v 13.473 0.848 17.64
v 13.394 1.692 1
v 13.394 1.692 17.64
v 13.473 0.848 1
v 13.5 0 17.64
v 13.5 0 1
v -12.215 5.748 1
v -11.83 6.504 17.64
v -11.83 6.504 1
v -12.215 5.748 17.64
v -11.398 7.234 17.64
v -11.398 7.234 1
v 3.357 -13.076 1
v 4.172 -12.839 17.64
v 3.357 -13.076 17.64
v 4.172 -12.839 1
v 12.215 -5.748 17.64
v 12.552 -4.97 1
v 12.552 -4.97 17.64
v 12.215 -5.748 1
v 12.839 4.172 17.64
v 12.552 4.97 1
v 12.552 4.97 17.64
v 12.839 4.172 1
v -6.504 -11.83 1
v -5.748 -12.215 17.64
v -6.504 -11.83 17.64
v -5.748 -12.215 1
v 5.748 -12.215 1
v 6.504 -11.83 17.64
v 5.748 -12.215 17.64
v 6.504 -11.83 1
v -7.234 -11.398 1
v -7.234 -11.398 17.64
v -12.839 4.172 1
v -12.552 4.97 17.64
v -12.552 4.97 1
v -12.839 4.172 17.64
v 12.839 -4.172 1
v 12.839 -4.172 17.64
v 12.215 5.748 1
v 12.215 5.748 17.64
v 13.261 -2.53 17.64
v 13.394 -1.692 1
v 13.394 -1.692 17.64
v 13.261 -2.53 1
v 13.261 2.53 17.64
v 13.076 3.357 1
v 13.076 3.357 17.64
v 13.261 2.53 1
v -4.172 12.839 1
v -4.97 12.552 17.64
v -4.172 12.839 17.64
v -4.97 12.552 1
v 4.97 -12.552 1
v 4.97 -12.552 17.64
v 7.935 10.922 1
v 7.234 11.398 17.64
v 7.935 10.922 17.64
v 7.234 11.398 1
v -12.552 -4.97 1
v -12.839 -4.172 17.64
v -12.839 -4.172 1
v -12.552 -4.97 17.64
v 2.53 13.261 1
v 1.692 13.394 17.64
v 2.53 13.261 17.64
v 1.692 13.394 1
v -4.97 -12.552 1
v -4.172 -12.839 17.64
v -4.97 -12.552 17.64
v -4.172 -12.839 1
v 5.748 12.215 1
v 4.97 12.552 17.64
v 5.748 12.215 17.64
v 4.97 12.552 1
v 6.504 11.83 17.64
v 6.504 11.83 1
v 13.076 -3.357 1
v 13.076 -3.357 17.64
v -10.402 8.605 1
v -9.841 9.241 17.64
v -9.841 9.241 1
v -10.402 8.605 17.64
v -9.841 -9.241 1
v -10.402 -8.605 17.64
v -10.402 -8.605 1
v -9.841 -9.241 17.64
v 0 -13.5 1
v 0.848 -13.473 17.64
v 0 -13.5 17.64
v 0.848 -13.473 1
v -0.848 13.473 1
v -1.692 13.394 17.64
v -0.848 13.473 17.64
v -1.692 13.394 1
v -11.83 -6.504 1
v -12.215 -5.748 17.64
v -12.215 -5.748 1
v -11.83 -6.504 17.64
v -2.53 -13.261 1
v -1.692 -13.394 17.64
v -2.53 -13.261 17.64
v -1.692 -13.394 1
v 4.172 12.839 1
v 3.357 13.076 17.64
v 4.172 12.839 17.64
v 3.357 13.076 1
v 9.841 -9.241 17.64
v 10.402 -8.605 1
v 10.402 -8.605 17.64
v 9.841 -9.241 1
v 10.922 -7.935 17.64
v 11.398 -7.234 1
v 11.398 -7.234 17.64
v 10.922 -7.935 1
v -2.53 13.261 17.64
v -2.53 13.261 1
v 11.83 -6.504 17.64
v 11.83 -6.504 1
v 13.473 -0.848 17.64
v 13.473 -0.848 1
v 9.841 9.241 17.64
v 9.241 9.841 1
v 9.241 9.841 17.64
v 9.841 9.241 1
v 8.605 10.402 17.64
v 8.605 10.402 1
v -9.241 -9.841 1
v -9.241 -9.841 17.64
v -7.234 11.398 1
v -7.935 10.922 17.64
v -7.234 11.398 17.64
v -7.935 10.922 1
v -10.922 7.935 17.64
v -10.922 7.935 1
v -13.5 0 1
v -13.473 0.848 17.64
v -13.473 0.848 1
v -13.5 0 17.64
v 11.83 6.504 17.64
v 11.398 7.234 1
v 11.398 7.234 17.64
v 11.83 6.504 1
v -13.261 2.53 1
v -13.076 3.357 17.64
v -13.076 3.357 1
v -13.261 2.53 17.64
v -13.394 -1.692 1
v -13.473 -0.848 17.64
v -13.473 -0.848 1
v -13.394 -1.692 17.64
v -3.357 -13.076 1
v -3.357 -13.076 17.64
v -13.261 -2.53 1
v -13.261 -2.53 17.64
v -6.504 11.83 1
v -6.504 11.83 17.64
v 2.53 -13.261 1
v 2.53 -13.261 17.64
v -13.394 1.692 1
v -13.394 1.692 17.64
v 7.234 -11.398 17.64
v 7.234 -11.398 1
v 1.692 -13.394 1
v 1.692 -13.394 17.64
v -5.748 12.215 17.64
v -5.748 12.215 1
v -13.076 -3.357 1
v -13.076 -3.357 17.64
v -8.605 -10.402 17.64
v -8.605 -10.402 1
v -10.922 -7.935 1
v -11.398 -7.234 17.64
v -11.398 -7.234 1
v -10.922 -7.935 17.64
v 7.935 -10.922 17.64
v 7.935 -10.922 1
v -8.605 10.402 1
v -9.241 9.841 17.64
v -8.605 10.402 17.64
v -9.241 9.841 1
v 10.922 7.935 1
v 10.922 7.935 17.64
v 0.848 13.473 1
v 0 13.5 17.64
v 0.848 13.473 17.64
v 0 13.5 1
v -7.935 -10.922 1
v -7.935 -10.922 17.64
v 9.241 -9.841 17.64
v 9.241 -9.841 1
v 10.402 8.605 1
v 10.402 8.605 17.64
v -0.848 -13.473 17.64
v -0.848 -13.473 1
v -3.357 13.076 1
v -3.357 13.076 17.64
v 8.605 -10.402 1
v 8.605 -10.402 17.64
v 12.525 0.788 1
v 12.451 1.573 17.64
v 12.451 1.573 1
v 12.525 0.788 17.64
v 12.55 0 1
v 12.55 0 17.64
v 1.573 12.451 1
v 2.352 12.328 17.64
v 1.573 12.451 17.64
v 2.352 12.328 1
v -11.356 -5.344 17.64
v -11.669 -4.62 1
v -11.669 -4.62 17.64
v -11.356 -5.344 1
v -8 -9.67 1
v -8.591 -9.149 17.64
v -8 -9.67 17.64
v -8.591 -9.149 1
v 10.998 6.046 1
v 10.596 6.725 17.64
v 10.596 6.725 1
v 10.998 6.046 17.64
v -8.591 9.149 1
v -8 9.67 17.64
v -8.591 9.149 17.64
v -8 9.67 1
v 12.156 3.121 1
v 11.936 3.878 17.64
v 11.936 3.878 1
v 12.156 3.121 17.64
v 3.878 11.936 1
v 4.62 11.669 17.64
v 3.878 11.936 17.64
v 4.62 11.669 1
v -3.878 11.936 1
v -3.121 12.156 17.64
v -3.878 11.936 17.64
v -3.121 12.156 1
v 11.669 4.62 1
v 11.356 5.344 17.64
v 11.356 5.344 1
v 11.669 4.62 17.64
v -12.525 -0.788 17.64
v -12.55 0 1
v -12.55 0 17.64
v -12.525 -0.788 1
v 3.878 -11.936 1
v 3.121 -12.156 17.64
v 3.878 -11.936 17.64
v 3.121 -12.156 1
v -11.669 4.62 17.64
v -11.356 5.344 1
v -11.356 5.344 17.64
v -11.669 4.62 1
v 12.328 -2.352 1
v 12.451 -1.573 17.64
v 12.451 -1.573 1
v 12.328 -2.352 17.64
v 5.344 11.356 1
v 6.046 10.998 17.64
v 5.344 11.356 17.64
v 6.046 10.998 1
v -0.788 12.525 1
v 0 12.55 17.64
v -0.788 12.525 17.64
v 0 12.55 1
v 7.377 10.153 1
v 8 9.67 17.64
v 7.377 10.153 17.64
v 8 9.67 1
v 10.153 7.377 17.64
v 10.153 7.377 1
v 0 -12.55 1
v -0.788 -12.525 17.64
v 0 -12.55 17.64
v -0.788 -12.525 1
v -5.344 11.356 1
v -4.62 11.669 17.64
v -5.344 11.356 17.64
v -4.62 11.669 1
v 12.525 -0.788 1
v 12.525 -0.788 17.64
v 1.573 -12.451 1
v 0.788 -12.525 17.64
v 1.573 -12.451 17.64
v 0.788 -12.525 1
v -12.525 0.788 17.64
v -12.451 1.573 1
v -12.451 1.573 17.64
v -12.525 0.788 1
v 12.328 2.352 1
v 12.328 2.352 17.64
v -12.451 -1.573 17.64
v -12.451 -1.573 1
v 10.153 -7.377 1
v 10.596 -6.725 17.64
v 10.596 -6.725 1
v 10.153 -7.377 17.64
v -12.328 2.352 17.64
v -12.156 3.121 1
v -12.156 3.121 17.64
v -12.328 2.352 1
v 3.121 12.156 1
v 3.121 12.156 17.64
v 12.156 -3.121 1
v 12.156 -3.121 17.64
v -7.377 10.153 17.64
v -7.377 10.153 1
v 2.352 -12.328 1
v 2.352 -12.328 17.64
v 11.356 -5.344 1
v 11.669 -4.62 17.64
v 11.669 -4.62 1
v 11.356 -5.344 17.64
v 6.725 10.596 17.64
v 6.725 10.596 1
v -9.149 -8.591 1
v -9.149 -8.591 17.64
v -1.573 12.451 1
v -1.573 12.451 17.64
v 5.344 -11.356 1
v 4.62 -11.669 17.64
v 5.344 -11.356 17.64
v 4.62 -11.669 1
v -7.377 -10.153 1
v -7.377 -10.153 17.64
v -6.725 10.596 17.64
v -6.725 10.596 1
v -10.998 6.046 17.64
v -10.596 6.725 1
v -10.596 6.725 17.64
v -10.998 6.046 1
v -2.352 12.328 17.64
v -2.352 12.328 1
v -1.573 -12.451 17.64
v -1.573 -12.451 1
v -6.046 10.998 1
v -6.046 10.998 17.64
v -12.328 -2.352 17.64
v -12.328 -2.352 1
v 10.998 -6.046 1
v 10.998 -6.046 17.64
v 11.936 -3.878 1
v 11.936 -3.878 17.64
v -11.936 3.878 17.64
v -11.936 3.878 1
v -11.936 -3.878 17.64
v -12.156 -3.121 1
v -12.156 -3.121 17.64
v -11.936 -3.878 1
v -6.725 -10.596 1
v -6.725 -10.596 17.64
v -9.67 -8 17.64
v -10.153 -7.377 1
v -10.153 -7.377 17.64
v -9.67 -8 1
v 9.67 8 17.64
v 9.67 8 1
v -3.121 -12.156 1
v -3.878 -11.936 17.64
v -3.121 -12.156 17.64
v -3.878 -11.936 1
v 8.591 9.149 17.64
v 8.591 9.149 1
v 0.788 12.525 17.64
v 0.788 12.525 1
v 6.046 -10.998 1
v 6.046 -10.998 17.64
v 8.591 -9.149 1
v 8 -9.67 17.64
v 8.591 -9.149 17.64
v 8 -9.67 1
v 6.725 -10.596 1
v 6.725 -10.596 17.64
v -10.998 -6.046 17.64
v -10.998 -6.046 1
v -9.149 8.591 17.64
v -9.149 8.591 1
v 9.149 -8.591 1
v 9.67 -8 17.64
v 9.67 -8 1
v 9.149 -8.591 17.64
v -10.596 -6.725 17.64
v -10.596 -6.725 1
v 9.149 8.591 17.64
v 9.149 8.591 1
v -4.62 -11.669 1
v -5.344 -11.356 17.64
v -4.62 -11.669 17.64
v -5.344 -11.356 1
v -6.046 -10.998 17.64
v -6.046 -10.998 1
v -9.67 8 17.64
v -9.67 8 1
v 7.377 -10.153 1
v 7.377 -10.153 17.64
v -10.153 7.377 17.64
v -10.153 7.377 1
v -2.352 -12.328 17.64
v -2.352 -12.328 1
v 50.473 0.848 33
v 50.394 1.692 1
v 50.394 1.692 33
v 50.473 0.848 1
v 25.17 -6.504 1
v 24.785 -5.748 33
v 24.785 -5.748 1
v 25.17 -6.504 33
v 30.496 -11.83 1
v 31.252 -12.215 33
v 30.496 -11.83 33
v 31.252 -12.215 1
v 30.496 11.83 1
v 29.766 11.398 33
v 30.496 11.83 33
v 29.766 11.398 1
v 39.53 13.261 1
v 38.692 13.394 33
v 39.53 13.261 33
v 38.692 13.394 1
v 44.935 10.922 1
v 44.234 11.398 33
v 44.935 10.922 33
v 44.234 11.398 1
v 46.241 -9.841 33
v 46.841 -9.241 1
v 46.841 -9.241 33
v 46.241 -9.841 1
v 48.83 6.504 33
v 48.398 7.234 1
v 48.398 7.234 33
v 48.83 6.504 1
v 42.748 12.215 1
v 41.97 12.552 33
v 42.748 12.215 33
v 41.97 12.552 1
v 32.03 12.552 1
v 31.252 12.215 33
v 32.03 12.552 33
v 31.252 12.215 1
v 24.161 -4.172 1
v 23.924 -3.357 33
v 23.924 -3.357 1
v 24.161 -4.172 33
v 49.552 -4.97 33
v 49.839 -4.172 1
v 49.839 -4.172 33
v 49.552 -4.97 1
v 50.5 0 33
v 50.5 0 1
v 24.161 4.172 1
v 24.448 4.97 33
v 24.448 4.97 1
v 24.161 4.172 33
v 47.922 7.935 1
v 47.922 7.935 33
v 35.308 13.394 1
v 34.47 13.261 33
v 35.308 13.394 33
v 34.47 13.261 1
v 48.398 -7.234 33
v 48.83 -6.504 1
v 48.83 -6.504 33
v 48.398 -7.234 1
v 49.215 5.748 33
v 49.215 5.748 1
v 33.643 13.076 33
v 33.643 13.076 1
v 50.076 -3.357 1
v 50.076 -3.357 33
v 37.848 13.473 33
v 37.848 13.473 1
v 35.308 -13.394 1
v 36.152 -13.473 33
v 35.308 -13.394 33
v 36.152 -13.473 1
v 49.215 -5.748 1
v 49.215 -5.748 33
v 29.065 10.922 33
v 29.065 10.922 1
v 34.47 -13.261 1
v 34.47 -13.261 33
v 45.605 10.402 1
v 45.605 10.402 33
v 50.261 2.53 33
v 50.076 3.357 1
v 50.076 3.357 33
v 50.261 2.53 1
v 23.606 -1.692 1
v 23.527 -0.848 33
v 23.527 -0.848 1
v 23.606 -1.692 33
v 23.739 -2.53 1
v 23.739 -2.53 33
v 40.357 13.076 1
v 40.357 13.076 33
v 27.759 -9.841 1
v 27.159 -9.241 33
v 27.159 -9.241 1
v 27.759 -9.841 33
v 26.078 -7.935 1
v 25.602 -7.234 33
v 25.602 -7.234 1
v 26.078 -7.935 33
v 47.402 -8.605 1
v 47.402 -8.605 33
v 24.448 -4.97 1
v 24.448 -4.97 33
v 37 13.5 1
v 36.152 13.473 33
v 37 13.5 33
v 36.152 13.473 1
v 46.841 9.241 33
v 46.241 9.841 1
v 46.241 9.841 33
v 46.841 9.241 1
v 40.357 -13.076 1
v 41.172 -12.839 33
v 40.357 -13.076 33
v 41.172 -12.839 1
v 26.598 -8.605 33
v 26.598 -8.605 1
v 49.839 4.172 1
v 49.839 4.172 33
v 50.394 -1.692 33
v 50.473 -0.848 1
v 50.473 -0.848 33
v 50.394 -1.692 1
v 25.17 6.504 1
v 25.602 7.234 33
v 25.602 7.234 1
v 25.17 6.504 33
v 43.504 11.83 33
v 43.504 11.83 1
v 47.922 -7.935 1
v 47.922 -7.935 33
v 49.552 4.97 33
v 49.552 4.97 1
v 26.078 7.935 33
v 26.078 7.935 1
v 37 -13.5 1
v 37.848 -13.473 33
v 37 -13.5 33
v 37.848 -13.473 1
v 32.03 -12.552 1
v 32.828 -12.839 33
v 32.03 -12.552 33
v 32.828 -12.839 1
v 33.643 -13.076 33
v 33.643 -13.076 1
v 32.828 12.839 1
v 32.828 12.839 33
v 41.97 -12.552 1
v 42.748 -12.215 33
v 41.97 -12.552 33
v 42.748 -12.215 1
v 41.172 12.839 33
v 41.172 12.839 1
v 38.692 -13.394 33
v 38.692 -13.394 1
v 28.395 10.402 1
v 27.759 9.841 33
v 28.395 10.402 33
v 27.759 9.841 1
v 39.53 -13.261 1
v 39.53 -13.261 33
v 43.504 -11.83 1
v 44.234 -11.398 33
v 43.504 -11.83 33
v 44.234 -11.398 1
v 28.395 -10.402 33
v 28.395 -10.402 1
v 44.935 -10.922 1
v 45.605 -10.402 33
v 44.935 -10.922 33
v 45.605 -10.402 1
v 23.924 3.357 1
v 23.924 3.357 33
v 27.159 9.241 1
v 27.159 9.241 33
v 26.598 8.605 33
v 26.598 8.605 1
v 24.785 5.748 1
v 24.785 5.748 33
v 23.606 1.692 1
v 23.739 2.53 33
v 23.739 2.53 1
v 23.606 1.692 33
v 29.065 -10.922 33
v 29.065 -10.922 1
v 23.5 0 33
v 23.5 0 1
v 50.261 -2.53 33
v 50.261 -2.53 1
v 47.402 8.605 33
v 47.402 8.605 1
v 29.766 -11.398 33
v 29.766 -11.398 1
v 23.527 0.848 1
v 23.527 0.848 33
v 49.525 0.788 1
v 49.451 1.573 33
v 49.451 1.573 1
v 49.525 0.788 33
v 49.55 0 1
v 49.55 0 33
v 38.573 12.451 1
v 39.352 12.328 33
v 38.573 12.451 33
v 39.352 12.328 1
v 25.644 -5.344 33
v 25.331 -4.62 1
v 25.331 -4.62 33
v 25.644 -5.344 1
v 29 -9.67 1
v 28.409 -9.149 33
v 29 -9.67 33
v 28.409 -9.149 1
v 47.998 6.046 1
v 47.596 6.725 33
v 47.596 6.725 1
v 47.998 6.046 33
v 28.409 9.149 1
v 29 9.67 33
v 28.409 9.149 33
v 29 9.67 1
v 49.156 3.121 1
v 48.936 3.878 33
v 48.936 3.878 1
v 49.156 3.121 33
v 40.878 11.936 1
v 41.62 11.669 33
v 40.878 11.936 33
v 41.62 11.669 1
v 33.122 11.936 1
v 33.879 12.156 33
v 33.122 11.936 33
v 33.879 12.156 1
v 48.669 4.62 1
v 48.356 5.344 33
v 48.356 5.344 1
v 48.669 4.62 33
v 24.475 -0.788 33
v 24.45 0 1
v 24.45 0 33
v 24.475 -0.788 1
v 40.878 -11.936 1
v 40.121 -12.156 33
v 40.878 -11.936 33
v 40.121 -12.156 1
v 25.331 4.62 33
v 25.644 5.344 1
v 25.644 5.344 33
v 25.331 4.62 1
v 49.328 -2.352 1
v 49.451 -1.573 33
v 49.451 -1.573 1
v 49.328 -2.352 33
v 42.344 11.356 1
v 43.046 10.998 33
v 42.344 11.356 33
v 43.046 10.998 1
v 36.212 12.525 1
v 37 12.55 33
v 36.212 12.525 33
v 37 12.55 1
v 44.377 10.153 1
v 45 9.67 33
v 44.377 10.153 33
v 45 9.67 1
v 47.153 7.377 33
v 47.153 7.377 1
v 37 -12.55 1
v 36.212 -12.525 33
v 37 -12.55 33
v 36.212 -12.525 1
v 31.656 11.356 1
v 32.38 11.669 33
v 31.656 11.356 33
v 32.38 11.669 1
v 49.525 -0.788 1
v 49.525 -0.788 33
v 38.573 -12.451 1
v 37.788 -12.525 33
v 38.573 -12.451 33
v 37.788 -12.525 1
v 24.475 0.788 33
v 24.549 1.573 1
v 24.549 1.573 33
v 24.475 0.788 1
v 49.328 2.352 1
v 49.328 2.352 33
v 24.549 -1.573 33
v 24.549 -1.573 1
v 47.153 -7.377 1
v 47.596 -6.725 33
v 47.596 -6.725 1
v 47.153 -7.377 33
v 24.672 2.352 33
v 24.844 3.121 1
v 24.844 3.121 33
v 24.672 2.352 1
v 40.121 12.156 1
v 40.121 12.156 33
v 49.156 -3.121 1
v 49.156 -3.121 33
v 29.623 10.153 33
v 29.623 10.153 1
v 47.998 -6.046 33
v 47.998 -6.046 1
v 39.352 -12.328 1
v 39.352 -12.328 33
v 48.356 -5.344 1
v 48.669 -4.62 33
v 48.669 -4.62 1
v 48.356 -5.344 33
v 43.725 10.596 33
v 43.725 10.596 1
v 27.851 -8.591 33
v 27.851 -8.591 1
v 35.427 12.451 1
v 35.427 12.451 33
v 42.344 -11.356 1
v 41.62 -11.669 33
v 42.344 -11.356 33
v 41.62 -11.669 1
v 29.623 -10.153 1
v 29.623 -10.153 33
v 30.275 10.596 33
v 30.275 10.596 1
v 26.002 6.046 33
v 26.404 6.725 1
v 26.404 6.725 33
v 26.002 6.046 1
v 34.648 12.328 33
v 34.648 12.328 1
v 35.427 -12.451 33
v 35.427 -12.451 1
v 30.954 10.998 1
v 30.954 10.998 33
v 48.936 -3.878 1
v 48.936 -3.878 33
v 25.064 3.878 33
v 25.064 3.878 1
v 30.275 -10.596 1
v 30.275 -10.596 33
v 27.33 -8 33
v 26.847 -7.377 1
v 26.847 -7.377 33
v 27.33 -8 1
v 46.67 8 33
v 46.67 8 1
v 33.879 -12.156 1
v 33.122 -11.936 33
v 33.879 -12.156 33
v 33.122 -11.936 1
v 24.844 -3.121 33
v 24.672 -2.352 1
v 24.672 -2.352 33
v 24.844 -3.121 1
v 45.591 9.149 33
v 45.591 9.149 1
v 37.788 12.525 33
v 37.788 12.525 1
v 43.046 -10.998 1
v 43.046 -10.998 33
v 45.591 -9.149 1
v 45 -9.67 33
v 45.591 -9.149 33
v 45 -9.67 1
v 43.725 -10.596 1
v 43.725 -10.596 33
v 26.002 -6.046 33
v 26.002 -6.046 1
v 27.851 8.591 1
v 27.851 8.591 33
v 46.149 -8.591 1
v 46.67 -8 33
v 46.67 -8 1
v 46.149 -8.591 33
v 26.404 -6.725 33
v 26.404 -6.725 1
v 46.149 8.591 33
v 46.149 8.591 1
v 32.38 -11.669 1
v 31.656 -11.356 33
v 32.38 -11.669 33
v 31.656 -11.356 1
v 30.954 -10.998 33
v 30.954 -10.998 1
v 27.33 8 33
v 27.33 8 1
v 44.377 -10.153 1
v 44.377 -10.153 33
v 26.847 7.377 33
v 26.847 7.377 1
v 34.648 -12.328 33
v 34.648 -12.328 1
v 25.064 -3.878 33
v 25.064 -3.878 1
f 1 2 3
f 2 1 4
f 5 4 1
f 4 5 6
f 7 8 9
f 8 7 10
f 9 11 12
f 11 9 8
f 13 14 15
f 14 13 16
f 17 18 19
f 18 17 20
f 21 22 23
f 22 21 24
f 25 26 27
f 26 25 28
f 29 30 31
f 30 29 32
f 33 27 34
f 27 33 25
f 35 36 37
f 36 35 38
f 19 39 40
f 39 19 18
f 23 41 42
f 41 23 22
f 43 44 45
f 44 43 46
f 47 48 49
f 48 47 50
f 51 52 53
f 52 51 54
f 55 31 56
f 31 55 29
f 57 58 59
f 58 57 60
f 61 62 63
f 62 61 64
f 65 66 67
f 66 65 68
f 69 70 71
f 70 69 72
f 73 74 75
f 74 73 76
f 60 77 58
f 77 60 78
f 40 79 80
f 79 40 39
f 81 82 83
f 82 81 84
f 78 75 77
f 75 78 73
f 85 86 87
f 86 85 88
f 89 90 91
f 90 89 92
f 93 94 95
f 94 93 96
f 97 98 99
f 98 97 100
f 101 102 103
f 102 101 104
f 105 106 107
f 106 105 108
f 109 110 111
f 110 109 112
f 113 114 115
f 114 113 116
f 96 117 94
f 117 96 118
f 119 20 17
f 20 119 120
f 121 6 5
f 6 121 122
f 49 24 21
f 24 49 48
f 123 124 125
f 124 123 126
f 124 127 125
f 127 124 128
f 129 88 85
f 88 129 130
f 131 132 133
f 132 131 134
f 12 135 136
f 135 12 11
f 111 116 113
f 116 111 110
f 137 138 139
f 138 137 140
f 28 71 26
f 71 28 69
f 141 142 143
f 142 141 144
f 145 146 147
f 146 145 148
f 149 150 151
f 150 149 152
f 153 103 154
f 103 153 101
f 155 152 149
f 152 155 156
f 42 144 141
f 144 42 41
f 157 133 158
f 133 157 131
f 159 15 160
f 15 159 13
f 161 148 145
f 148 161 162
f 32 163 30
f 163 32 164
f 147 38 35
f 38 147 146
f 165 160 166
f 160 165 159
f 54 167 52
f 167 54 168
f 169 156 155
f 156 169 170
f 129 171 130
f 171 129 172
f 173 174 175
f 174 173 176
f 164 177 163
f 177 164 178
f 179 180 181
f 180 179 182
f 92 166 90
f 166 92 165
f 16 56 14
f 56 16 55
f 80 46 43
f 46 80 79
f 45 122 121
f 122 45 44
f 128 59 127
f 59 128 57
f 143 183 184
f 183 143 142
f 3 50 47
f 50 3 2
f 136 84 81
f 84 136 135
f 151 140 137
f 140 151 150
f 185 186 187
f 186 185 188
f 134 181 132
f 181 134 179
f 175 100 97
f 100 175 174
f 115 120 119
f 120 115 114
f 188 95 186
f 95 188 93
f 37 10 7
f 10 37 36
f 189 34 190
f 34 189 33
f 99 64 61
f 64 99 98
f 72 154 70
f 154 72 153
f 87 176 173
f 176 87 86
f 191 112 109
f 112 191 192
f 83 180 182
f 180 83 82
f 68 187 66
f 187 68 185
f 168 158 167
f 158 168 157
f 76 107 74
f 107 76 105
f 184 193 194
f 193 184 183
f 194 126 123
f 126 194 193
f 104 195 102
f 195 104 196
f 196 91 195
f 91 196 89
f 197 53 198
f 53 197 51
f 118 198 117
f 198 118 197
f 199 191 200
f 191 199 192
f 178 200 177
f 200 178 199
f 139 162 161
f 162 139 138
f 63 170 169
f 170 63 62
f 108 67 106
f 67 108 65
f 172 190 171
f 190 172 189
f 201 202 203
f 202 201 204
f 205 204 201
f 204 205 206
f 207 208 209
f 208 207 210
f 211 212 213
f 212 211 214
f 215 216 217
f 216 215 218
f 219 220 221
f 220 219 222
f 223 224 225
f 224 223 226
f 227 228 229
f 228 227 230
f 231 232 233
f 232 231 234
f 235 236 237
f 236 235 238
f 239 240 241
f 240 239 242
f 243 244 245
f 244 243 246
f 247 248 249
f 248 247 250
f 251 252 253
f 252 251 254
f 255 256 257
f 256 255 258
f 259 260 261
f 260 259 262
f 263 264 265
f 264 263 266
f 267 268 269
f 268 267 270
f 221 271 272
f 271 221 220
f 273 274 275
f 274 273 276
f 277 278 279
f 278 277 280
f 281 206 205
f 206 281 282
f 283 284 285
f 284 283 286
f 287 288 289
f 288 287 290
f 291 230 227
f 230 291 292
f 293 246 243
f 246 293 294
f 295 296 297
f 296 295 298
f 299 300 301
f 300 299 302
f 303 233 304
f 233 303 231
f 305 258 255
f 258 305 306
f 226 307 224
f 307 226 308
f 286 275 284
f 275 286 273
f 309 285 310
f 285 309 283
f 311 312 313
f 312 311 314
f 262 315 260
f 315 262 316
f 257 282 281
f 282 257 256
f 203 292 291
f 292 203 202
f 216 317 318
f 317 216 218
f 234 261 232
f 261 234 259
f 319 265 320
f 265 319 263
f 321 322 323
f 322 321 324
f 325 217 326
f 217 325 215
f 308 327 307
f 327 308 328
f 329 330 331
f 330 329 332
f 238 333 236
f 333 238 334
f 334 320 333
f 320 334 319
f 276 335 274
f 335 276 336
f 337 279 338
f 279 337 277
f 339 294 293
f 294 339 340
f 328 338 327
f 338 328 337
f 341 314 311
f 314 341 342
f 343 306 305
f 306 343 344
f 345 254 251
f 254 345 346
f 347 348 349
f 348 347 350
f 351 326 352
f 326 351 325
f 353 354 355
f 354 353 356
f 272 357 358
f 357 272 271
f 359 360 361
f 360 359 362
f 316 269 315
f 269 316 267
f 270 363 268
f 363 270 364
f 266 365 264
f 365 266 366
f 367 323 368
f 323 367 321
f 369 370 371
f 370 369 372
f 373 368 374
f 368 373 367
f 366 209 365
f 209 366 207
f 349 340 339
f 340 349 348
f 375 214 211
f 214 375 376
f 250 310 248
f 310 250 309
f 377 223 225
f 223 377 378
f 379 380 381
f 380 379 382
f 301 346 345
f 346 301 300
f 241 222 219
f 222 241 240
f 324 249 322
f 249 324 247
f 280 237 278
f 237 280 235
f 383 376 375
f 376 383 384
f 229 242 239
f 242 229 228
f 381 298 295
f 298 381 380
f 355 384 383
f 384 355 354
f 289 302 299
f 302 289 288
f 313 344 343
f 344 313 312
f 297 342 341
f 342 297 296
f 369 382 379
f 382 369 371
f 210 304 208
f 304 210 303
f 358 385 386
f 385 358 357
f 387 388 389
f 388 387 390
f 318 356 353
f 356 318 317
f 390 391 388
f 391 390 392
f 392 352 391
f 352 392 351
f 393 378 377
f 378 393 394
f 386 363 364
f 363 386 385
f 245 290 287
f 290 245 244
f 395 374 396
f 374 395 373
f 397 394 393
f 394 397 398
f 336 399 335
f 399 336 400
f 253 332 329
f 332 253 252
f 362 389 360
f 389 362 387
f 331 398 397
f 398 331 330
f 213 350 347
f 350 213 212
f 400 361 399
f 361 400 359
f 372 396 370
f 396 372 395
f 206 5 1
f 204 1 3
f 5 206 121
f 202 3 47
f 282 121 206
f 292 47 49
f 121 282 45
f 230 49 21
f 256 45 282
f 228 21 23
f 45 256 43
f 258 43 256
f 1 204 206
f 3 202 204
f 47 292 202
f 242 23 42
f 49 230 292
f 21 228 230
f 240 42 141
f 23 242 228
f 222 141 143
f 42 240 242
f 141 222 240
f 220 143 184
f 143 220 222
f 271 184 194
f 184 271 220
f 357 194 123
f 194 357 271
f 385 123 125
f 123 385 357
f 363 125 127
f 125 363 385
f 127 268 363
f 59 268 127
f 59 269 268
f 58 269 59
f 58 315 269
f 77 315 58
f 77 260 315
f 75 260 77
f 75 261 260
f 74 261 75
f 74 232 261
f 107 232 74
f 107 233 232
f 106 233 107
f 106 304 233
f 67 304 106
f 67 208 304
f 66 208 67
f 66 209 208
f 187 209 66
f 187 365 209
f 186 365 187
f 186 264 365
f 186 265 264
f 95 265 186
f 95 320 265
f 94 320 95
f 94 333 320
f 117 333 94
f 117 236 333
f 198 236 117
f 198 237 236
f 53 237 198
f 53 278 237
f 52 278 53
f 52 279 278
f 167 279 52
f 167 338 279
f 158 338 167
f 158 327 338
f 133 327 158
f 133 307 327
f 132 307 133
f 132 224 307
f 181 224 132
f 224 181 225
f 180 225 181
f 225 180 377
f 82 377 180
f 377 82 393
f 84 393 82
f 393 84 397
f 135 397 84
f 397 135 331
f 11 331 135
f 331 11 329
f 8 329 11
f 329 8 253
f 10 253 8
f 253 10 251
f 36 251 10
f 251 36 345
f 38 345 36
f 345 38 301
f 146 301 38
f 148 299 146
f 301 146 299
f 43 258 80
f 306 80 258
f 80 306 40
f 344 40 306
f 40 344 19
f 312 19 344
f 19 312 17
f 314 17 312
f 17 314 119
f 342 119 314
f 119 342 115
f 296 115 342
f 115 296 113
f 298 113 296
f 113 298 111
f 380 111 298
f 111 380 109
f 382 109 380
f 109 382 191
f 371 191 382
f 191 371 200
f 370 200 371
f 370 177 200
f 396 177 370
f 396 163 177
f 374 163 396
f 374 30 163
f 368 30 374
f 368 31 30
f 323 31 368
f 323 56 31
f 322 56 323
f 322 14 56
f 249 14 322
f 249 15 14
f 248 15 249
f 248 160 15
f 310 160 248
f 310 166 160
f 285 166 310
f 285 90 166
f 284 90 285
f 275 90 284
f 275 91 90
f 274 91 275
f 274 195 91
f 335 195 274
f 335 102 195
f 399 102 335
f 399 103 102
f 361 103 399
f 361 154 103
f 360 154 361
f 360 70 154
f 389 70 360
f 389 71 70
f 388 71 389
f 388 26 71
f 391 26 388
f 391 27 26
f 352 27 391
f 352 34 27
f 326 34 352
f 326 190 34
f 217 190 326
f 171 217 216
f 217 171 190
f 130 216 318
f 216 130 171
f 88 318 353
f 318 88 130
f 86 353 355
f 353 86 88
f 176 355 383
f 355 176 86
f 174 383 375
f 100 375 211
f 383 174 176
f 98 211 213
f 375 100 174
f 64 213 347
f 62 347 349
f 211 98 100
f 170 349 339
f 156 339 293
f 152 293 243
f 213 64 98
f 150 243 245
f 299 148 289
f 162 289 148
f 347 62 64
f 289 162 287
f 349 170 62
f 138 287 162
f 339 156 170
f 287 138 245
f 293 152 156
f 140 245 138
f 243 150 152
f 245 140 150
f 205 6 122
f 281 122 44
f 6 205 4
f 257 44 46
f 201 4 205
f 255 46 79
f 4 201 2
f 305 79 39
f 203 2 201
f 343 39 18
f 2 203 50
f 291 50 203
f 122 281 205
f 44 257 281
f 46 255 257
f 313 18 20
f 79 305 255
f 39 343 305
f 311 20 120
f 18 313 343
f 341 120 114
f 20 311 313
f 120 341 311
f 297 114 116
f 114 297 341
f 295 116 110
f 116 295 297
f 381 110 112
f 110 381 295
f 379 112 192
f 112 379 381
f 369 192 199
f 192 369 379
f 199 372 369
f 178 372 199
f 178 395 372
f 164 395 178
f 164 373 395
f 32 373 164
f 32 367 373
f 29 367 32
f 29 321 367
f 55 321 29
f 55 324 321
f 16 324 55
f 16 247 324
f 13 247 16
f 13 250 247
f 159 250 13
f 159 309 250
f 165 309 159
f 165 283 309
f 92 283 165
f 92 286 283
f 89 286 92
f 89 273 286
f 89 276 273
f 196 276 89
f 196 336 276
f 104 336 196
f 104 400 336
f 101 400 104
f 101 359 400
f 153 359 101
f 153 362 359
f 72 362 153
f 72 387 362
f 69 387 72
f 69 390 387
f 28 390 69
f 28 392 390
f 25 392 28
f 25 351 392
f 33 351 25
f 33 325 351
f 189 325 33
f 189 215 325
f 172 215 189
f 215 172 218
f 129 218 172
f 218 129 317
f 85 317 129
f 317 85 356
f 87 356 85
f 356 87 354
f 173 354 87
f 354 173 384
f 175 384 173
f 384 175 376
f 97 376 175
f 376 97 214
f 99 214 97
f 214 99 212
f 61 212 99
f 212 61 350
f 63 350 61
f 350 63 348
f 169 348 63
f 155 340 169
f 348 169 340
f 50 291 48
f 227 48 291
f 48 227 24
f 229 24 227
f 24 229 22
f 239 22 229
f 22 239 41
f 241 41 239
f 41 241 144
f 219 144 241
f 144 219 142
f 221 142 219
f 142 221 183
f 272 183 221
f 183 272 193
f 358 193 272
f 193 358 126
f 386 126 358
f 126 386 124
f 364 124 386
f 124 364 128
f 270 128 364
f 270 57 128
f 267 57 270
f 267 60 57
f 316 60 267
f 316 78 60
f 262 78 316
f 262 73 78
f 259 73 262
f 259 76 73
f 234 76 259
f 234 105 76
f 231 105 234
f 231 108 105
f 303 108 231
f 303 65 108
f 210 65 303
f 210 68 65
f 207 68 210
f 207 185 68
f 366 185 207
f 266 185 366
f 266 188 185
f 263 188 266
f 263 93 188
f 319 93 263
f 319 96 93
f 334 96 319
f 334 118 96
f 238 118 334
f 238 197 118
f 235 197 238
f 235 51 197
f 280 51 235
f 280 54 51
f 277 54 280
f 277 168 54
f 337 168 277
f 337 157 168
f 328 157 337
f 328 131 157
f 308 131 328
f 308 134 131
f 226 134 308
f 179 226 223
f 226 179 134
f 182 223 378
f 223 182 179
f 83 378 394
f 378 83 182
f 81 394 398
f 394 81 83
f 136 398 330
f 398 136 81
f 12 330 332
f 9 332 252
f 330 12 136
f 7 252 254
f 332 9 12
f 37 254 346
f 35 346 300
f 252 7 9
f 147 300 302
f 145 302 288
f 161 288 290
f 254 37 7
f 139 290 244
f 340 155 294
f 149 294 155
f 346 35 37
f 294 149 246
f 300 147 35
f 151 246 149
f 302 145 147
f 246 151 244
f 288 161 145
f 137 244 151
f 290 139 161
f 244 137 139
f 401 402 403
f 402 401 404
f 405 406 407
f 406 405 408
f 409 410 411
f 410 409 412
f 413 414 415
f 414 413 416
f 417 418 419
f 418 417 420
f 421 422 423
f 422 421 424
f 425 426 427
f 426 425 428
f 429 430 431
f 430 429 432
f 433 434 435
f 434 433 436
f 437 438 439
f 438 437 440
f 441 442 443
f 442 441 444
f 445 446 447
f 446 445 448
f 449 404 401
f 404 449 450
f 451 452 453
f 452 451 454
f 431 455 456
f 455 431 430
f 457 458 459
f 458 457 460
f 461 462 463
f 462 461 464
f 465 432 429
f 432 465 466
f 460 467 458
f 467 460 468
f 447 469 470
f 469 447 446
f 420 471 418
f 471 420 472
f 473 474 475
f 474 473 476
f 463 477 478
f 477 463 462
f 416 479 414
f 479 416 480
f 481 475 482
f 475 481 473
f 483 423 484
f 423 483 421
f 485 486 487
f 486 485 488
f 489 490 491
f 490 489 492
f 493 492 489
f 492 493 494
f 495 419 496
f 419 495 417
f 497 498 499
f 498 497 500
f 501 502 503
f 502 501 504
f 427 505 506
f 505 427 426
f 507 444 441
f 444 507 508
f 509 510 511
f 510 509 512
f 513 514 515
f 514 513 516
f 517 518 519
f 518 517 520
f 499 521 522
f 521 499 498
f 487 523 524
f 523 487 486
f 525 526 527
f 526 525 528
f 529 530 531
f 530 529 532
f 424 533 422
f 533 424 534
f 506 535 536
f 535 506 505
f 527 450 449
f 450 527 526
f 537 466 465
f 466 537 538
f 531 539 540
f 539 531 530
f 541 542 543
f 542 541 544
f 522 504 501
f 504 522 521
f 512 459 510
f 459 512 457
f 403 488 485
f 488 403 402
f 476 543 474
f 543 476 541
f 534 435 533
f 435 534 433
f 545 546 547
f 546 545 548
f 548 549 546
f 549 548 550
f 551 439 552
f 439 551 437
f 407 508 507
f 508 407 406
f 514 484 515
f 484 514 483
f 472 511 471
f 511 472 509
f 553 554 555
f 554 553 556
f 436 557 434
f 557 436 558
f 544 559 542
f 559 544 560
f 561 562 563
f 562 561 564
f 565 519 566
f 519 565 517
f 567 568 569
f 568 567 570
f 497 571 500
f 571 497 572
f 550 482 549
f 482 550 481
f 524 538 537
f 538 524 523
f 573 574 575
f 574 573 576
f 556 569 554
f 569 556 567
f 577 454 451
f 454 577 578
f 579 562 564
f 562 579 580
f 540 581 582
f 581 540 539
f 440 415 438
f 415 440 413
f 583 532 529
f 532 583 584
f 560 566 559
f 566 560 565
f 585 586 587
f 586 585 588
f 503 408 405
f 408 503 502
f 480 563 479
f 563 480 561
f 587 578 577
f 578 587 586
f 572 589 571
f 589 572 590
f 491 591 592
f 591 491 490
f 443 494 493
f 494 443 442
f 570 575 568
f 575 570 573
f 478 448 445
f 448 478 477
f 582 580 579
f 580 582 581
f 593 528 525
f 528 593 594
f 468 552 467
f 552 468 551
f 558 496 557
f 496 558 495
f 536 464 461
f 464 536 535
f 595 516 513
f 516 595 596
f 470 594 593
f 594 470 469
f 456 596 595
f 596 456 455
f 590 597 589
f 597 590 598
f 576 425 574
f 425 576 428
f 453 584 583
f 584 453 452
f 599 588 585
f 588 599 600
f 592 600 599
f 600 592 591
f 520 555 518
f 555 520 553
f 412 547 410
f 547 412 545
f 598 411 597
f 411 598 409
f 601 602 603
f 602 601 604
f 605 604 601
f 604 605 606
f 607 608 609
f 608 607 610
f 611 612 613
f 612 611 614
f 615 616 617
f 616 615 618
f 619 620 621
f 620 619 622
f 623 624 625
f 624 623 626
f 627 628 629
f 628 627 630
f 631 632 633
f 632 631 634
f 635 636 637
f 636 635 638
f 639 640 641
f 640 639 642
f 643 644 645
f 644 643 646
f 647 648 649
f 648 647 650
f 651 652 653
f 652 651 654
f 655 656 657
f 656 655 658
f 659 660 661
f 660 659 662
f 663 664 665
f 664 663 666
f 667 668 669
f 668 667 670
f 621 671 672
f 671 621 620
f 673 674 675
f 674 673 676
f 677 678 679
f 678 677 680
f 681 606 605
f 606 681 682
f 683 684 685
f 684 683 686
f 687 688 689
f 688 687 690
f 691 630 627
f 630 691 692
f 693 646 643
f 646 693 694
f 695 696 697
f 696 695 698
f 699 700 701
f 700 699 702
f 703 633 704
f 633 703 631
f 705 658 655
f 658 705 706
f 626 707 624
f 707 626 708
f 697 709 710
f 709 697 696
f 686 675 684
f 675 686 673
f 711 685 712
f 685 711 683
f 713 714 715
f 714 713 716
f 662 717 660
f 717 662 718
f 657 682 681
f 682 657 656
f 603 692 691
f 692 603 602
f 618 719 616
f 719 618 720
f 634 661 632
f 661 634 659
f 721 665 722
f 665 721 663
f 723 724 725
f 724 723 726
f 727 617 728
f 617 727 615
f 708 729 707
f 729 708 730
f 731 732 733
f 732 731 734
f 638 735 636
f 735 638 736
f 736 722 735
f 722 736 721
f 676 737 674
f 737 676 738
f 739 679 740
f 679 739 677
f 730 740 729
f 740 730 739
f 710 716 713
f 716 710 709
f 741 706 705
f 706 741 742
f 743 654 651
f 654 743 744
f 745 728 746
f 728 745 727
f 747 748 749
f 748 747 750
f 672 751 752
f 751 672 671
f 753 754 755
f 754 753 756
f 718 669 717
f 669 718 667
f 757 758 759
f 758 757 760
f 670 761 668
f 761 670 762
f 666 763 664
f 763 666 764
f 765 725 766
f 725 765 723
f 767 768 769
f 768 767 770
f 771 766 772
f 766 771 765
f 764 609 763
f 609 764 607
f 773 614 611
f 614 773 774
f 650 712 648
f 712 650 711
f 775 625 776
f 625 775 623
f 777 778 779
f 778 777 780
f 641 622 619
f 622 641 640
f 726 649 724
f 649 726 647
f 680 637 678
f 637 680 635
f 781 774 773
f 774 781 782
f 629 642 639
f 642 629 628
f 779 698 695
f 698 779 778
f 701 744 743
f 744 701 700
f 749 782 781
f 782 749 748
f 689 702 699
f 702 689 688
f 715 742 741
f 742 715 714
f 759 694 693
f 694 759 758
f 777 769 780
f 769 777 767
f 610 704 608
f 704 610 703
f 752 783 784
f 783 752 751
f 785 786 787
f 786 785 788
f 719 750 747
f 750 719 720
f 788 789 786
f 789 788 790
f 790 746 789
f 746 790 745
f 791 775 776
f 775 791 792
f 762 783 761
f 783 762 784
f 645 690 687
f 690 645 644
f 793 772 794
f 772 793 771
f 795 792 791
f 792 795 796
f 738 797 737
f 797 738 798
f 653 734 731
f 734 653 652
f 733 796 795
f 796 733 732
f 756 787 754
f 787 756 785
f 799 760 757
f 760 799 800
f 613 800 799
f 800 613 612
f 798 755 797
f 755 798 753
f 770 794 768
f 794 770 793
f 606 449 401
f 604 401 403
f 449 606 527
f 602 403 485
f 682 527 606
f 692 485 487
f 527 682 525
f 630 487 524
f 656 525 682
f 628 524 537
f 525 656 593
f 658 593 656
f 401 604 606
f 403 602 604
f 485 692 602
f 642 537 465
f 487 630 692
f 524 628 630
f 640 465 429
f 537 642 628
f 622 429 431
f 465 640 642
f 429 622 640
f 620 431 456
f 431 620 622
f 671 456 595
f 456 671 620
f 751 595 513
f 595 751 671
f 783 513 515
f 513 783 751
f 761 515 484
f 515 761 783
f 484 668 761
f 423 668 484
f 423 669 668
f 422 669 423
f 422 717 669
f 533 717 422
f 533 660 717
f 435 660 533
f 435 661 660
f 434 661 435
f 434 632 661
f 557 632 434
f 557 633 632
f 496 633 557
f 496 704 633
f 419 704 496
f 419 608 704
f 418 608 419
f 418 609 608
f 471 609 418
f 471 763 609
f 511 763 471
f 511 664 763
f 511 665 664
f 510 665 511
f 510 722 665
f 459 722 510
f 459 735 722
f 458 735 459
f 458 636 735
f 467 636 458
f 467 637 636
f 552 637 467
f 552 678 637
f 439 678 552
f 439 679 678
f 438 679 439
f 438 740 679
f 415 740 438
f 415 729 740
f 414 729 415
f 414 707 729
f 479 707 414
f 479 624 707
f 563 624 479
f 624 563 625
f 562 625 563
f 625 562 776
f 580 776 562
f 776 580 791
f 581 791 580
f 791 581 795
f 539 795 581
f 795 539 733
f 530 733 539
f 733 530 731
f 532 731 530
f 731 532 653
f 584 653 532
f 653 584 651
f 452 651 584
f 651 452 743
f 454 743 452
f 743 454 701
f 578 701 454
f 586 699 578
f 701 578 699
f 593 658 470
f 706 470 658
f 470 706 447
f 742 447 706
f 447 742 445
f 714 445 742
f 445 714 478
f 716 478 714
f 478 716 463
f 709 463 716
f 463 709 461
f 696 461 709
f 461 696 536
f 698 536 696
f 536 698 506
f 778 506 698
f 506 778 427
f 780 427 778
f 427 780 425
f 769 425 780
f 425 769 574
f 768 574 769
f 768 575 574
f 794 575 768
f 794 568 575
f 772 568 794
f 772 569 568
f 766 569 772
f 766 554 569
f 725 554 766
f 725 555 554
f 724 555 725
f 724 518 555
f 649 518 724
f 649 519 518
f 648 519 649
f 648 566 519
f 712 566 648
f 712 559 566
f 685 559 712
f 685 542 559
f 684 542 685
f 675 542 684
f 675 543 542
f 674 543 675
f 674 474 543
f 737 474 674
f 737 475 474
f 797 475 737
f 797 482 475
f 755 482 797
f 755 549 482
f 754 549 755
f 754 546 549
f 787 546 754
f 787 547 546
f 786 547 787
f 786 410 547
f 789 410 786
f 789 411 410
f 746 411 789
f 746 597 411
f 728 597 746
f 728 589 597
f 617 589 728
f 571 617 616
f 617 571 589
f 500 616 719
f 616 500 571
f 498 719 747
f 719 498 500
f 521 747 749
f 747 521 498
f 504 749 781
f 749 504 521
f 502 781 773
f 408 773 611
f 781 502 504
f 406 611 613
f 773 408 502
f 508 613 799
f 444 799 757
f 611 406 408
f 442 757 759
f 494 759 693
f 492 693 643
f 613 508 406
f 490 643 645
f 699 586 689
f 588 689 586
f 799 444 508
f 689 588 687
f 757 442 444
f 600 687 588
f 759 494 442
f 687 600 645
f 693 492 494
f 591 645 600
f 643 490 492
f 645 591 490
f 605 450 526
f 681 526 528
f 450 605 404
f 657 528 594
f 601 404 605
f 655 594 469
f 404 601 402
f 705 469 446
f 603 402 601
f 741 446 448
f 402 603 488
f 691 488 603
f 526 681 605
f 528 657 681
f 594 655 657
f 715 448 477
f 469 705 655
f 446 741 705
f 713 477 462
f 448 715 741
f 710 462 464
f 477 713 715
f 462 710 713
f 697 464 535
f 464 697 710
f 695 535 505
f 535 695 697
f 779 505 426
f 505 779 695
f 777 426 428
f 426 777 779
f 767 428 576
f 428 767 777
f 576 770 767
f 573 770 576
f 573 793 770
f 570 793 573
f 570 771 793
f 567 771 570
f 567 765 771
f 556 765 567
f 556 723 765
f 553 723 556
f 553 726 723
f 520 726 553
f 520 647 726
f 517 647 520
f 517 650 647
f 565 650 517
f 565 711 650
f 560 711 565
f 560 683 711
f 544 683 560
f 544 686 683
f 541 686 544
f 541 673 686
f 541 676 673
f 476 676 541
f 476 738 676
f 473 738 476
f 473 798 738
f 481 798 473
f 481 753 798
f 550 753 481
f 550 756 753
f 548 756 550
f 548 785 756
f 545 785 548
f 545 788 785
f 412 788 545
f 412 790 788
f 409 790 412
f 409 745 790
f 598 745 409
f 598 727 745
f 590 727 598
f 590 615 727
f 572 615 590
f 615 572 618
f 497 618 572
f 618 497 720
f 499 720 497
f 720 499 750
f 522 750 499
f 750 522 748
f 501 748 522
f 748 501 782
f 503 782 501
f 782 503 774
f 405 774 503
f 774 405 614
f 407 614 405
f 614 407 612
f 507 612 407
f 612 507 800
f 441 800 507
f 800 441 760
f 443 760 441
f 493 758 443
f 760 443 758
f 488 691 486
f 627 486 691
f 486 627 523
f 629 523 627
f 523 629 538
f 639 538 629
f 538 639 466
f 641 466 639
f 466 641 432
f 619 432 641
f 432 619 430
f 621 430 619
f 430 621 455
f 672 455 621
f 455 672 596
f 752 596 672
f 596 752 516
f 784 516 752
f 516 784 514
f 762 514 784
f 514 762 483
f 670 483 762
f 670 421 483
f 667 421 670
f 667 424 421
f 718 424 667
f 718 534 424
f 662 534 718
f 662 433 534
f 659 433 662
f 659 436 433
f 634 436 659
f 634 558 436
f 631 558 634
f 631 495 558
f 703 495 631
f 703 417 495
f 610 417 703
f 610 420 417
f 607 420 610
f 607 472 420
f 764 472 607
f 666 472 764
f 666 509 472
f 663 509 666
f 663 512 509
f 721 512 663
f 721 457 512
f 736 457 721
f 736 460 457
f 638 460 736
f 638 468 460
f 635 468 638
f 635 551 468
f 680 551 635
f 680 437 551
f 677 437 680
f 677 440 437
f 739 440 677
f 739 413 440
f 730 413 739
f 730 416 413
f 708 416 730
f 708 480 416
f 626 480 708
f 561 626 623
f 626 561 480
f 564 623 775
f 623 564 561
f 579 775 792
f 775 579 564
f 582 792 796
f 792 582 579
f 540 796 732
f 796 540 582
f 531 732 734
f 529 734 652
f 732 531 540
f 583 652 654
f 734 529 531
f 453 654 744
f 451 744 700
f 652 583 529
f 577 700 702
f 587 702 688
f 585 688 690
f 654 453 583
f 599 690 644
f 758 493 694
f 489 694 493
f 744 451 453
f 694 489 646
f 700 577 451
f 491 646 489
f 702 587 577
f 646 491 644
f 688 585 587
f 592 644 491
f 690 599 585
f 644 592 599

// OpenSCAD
// Adaptador de cano - bucha 27mm (externo) / 25mm (interno)

folga_externa = 0;  // quanto reduzir do diametro externo (27mm)
folga_interna = 0;  // quanto aumentar do diametro interno (25.1mm)

diametro_externo = 27 - folga_externa;
diametro_interno = 25.1 + folga_interna;
alturas = [18.64, 34];
chanfro = 1;        // chanfro nas bordas, 0 pra desativar
$fn = 100;

module adaptador(comprimento) {
    difference() {
        cylinder(h = comprimento, d = diametro_externo, center = false);
        translate([0, 0, -0.5])
            cylinder(h = comprimento + 1, d = diametro_interno, center = false);
    }
}

module chanfrado(comprimento) {
    if (chanfro > 0) {
        difference() {
            adaptador(comprimento);
            // chanfro na borda superior
            translate([0, 0, comprimento - chanfro])
                cylinder(h = chanfro + 0.5, d1 = diametro_externo, d2 = diametro_externo + chanfro * 2, center = false);
            // chanfro na borda inferior
            translate([0, 0, -0.5])
                cylinder(h = chanfro + 0.5, d1 = diametro_externo + chanfro * 2, d2 = diametro_externo, center = false);
        }
    } else {
        adaptador(comprimento);
    }
}

espacamento = diametro_externo + 10;

for (i = [0 : len(alturas) - 1]) {
    translate([i * espacamento, 0, 0])
        chanfrado(alturas[i]);
}
